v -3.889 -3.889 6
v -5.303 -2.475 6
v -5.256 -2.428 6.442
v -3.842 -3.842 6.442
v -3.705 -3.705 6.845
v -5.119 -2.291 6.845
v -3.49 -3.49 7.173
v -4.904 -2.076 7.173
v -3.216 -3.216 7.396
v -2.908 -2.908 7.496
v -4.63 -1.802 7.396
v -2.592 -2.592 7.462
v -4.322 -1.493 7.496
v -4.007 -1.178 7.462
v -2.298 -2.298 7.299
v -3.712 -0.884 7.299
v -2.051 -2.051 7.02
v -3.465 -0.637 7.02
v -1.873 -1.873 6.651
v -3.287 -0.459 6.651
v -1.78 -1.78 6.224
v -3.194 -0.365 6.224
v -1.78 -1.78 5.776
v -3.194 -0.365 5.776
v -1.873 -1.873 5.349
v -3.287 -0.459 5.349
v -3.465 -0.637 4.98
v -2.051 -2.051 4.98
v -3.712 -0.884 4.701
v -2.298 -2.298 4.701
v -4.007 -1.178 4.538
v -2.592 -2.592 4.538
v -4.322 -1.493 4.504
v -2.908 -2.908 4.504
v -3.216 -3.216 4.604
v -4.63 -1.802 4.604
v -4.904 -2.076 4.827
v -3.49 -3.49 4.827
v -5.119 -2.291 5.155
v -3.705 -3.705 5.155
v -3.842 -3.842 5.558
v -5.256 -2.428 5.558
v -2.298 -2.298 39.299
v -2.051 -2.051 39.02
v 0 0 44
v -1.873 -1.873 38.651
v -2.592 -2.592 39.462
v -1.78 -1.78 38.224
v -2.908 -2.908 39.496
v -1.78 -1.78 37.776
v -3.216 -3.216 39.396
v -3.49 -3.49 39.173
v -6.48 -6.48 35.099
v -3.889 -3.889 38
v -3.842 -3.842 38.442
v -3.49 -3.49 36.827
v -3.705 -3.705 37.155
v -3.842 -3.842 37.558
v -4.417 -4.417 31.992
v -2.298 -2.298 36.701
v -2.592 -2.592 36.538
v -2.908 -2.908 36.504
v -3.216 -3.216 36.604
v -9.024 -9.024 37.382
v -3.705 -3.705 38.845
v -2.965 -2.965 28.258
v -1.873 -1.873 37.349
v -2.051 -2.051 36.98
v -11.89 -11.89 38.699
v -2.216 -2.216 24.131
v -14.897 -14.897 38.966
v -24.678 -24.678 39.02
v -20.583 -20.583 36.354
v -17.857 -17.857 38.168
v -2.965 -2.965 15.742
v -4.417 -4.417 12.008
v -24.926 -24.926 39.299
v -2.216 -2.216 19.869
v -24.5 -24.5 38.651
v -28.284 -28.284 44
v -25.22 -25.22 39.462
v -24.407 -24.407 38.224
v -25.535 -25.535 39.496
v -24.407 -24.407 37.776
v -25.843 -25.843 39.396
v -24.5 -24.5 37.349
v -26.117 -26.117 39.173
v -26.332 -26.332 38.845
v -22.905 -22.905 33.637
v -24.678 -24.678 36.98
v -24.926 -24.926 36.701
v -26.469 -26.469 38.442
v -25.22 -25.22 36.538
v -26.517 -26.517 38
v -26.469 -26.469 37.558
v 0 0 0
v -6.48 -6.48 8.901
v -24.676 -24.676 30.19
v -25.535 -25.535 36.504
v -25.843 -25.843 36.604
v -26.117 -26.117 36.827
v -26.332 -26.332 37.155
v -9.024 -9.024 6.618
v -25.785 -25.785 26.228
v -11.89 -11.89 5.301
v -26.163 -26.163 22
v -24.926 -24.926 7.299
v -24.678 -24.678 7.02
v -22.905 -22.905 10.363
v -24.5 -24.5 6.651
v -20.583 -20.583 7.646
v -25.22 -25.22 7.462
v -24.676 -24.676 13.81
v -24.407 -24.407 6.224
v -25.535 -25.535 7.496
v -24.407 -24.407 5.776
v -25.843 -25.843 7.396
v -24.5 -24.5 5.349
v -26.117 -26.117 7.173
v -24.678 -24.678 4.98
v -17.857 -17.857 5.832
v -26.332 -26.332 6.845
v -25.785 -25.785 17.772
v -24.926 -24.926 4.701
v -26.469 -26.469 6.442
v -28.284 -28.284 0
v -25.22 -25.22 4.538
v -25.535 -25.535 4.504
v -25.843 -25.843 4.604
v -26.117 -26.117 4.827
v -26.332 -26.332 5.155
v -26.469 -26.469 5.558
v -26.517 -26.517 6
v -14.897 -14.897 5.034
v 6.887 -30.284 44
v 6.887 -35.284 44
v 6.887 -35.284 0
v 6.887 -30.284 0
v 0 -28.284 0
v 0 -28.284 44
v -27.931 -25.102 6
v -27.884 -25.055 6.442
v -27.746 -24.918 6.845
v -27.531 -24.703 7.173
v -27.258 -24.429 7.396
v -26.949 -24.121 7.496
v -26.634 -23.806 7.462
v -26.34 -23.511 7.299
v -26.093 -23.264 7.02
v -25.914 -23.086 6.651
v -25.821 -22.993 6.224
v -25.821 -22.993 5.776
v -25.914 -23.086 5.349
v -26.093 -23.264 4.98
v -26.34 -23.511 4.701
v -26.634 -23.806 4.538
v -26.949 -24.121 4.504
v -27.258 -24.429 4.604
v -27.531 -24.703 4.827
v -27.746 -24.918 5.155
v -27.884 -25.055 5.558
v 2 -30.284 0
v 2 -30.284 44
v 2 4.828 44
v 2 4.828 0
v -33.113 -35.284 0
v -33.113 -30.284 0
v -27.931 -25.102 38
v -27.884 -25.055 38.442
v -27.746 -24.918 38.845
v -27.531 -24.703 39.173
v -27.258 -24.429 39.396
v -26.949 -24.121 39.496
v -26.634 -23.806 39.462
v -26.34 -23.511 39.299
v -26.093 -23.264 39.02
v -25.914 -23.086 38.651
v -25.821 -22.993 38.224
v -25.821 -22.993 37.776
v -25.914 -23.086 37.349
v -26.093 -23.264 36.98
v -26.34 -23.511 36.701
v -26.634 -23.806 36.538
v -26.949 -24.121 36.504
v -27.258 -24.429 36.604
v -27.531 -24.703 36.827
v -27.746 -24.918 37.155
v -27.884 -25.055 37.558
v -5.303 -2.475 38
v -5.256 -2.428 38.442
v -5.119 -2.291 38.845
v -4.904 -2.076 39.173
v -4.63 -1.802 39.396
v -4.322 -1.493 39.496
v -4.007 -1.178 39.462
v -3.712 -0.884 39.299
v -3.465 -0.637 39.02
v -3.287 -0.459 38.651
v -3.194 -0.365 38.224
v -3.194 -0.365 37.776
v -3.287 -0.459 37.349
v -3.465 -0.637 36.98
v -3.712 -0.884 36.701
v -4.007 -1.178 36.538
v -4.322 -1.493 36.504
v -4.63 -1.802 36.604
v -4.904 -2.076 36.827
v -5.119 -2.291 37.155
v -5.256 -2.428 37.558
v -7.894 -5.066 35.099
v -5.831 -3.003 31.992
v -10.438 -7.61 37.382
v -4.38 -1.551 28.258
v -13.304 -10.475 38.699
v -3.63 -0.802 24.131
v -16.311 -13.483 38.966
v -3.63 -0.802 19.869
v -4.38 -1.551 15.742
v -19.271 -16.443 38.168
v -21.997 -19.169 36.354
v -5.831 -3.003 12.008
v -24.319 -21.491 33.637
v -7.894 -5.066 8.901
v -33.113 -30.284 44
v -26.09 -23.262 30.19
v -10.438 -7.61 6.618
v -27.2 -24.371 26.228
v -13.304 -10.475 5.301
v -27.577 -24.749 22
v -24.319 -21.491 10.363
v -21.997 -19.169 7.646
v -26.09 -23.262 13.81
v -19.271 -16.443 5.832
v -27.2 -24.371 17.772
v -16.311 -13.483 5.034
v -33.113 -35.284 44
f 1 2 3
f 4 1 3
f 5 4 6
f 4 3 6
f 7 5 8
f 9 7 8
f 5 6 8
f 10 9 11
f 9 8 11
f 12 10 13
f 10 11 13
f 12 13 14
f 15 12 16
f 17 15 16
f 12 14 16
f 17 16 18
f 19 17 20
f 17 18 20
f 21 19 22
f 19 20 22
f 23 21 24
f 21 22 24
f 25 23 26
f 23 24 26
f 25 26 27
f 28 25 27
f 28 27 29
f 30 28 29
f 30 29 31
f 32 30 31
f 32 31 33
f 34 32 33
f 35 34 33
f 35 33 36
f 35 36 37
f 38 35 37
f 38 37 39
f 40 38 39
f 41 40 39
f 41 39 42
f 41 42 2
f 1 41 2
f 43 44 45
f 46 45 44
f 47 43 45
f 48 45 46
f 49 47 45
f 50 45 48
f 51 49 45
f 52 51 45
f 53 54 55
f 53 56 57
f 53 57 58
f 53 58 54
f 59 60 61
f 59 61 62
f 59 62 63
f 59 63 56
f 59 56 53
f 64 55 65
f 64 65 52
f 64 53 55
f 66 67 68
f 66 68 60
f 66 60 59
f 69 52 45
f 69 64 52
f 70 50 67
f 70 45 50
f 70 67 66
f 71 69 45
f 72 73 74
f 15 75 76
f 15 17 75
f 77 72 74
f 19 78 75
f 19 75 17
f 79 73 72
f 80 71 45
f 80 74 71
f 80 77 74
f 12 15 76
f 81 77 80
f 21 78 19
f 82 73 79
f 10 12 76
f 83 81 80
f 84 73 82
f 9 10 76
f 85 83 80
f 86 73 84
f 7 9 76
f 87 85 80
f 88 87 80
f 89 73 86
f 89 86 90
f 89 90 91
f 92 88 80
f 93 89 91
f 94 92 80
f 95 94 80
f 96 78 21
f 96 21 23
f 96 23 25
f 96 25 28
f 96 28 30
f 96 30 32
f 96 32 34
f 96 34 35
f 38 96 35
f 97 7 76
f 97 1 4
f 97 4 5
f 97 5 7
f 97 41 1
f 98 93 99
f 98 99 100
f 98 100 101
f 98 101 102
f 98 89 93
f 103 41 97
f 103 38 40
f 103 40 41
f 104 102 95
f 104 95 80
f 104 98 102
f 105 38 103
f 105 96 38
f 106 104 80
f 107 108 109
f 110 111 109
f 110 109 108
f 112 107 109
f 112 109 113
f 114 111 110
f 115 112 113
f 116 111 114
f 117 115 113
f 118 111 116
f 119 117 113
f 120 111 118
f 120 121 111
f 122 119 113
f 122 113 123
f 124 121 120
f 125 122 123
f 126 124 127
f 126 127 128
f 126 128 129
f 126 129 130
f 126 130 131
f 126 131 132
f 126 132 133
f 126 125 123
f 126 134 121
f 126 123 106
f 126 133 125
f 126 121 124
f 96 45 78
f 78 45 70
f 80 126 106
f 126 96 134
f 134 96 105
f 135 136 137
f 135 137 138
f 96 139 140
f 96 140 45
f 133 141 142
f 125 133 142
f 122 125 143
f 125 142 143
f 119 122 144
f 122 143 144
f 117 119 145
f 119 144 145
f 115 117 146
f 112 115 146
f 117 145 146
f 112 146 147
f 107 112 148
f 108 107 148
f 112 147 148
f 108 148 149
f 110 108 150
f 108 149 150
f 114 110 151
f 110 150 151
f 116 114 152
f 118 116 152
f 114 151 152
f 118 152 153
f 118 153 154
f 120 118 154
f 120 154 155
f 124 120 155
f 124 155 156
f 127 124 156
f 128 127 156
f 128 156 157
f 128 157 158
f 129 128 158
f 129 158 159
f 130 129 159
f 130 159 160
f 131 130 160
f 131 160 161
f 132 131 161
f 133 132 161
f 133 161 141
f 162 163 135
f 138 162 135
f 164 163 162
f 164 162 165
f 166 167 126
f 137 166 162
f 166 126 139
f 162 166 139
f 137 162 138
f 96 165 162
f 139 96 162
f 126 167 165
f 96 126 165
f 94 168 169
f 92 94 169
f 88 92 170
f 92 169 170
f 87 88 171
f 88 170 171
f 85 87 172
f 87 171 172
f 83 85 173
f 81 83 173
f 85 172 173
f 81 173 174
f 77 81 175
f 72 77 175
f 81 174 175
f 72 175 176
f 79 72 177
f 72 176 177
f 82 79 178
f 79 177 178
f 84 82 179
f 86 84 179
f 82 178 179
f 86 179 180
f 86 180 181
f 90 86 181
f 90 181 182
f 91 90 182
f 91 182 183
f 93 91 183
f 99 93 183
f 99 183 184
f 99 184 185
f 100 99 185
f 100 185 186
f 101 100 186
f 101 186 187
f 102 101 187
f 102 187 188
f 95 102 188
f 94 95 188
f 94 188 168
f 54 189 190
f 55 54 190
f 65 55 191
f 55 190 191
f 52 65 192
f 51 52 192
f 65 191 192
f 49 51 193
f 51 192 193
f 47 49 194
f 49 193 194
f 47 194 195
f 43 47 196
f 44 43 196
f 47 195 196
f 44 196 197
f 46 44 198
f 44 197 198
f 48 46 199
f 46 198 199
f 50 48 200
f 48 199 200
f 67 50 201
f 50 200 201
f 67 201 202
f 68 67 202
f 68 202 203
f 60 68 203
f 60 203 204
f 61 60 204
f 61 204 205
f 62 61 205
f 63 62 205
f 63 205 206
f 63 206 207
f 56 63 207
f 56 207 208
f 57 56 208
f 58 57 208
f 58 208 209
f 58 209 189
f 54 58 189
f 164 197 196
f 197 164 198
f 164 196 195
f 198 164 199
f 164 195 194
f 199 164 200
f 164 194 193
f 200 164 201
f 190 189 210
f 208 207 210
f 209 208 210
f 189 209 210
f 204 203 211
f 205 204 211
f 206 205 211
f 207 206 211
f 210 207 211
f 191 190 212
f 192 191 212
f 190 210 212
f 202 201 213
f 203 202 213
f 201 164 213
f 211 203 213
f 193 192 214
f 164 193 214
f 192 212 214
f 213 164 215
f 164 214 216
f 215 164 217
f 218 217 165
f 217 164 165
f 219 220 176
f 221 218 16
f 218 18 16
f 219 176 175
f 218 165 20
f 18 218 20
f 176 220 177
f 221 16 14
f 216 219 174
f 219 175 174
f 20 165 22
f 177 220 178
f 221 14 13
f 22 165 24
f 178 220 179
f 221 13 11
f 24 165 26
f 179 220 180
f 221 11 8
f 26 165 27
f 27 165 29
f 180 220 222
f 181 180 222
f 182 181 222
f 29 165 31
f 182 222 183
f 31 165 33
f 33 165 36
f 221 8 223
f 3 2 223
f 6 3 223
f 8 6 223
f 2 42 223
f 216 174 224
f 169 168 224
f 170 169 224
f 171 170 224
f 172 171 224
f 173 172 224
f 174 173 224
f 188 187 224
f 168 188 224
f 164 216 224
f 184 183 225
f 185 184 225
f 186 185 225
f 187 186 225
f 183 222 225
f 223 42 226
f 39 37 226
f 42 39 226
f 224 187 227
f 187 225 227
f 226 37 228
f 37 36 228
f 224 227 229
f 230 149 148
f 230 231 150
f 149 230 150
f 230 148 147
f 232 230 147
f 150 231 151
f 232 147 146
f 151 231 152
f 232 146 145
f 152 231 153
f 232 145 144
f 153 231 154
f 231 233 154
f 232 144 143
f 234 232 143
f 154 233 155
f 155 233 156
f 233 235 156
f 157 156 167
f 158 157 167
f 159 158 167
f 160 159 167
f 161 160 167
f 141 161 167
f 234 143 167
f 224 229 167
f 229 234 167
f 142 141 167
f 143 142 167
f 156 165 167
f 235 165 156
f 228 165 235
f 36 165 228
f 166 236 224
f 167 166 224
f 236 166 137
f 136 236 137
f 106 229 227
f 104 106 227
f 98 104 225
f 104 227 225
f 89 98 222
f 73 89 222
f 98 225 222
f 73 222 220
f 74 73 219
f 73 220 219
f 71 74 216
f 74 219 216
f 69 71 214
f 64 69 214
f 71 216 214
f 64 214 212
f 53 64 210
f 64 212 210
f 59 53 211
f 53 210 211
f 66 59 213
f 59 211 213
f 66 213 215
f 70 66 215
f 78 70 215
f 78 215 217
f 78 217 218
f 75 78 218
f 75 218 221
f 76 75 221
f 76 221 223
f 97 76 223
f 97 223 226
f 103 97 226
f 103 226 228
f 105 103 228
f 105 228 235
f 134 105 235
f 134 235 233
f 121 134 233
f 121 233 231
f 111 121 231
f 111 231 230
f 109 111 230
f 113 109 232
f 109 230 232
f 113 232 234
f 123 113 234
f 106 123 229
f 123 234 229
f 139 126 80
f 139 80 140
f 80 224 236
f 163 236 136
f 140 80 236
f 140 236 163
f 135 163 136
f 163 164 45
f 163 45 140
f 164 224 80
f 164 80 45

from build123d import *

# Parameters (mm, degrees)
BOSS_EXTRUDE1_DEPTH = 44
CUT_EXTRUDE1_REACH  = 64.814
SKETCH2_R           = 1.5
SKETCH2_R_2         = 17
SKETCH3_W           = 40
SKETCH3_H           = 5
BOSS_EXTRUDE2_DEPTH = 44


with BuildPart() as part:
    # Sketch1 → Boss-Extrude1 (new body)
    with BuildSketch(Plane.XY):
        Polygon((2, 4.828427125), (-33.112698372, -30.284271247), (2, -30.284271247), align=None)
        Polygon((0, 0), (-28.284271247, -28.284271247), (0, -28.284271247), align=None, mode=Mode.SUBTRACT)
    extrude(amount=BOSS_EXTRUDE1_DEPTH)

    # Sketch2 → Cut-Extrude1 (cut, up to next)
    with BuildSketch(Plane(origin=(-1.414213562, 1.414213562, 0), x_dir=(0, 0, 1), z_dir=(-0.7071067811865513, 0.7071067811865437, 0)), mode=Mode.PRIVATE) as cut_extrude1_sk1:
        with Locations(Location((6, -36, 0), (0, 0, 270))):
            Circle(SKETCH2_R)
    cut_extrude1_tool1 = extrude(cut_extrude1_sk1.sketch, amount=-CUT_EXTRUDE1_REACH, mode=Mode.PRIVATE) & part.part
    # Sketch2 → Cut-Extrude1 (cut, up to next)
    with BuildSketch(Plane(origin=(-1.414213562, 1.414213562, 0), x_dir=(0, 0, 1), z_dir=(-0.7071067811865513, 0.7071067811865437, 0)), mode=Mode.PRIVATE) as cut_extrude1_sk2:
        with Locations(Location((6, -4, 0), (0, 0, 270))):
            Circle(SKETCH2_R)
    cut_extrude1_tool2 = extrude(cut_extrude1_sk2.sketch, amount=-CUT_EXTRUDE1_REACH, mode=Mode.PRIVATE) & part.part
    # Sketch2 → Cut-Extrude1 (cut, up to next)
    with BuildSketch(Plane(origin=(-1.414213562, 1.414213562, 0), x_dir=(0, 0, 1), z_dir=(-0.7071067811865513, 0.7071067811865437, 0)), mode=Mode.PRIVATE) as cut_extrude1_sk3:
        with Locations(Location((38, -36, 0), (0, 0, 270))):
            Circle(SKETCH2_R)
    cut_extrude1_tool3 = extrude(cut_extrude1_sk3.sketch, amount=-CUT_EXTRUDE1_REACH, mode=Mode.PRIVATE) & part.part
    # Sketch2 → Cut-Extrude1 (cut, up to next)
    with BuildSketch(Plane(origin=(-1.414213562, 1.414213562, 0), x_dir=(0, 0, 1), z_dir=(-0.7071067811865513, 0.7071067811865437, 0)), mode=Mode.PRIVATE) as cut_extrude1_sk4:
        with Locations(Location((38, -4, 0), (0, 0, 270))):
            Circle(SKETCH2_R)
    cut_extrude1_tool4 = extrude(cut_extrude1_sk4.sketch, amount=-CUT_EXTRUDE1_REACH, mode=Mode.PRIVATE) & part.part
    # Sketch2 → Cut-Extrude1 (cut, up to next)
    with BuildSketch(Plane(origin=(-1.414213562, 1.414213562, 0), x_dir=(0, 0, 1), z_dir=(-0.7071067811865513, 0.7071067811865437, 0)), mode=Mode.PRIVATE) as cut_extrude1_sk5:
        with Locations(Location((22, -20, 0), (0, 0, 270))):
            Circle(SKETCH2_R_2)
    cut_extrude1_tool5 = extrude(cut_extrude1_sk5.sketch, amount=-CUT_EXTRUDE1_REACH, mode=Mode.PRIVATE) & part.part
    add(cut_extrude1_tool1.solids().sort_by_distance((-26.870058, -24.041631, 6))[0], mode=Mode.SUBTRACT)
    add(cut_extrude1_tool2.solids().sort_by_distance((-4.242641, -1.414214, 6))[0], mode=Mode.SUBTRACT)
    add(cut_extrude1_tool3.solids().sort_by_distance((-26.870058, -24.041631, 38))[0], mode=Mode.SUBTRACT)
    add(cut_extrude1_tool4.solids().sort_by_distance((-4.242641, -1.414214, 38))[0], mode=Mode.SUBTRACT)
    add(cut_extrude1_tool5.solids().sort_by_distance((-15.556349, -12.727922, 22))[0], mode=Mode.SUBTRACT)

    # Sketch3 → Boss-Extrude2 (add)
    with BuildSketch(Plane.XY):
        with Locations((-13.112698372, -32.784271247)):
            Rectangle(SKETCH3_W, SKETCH3_H)
    extrude(amount=BOSS_EXTRUDE2_DEPTH)


solid = part.part
